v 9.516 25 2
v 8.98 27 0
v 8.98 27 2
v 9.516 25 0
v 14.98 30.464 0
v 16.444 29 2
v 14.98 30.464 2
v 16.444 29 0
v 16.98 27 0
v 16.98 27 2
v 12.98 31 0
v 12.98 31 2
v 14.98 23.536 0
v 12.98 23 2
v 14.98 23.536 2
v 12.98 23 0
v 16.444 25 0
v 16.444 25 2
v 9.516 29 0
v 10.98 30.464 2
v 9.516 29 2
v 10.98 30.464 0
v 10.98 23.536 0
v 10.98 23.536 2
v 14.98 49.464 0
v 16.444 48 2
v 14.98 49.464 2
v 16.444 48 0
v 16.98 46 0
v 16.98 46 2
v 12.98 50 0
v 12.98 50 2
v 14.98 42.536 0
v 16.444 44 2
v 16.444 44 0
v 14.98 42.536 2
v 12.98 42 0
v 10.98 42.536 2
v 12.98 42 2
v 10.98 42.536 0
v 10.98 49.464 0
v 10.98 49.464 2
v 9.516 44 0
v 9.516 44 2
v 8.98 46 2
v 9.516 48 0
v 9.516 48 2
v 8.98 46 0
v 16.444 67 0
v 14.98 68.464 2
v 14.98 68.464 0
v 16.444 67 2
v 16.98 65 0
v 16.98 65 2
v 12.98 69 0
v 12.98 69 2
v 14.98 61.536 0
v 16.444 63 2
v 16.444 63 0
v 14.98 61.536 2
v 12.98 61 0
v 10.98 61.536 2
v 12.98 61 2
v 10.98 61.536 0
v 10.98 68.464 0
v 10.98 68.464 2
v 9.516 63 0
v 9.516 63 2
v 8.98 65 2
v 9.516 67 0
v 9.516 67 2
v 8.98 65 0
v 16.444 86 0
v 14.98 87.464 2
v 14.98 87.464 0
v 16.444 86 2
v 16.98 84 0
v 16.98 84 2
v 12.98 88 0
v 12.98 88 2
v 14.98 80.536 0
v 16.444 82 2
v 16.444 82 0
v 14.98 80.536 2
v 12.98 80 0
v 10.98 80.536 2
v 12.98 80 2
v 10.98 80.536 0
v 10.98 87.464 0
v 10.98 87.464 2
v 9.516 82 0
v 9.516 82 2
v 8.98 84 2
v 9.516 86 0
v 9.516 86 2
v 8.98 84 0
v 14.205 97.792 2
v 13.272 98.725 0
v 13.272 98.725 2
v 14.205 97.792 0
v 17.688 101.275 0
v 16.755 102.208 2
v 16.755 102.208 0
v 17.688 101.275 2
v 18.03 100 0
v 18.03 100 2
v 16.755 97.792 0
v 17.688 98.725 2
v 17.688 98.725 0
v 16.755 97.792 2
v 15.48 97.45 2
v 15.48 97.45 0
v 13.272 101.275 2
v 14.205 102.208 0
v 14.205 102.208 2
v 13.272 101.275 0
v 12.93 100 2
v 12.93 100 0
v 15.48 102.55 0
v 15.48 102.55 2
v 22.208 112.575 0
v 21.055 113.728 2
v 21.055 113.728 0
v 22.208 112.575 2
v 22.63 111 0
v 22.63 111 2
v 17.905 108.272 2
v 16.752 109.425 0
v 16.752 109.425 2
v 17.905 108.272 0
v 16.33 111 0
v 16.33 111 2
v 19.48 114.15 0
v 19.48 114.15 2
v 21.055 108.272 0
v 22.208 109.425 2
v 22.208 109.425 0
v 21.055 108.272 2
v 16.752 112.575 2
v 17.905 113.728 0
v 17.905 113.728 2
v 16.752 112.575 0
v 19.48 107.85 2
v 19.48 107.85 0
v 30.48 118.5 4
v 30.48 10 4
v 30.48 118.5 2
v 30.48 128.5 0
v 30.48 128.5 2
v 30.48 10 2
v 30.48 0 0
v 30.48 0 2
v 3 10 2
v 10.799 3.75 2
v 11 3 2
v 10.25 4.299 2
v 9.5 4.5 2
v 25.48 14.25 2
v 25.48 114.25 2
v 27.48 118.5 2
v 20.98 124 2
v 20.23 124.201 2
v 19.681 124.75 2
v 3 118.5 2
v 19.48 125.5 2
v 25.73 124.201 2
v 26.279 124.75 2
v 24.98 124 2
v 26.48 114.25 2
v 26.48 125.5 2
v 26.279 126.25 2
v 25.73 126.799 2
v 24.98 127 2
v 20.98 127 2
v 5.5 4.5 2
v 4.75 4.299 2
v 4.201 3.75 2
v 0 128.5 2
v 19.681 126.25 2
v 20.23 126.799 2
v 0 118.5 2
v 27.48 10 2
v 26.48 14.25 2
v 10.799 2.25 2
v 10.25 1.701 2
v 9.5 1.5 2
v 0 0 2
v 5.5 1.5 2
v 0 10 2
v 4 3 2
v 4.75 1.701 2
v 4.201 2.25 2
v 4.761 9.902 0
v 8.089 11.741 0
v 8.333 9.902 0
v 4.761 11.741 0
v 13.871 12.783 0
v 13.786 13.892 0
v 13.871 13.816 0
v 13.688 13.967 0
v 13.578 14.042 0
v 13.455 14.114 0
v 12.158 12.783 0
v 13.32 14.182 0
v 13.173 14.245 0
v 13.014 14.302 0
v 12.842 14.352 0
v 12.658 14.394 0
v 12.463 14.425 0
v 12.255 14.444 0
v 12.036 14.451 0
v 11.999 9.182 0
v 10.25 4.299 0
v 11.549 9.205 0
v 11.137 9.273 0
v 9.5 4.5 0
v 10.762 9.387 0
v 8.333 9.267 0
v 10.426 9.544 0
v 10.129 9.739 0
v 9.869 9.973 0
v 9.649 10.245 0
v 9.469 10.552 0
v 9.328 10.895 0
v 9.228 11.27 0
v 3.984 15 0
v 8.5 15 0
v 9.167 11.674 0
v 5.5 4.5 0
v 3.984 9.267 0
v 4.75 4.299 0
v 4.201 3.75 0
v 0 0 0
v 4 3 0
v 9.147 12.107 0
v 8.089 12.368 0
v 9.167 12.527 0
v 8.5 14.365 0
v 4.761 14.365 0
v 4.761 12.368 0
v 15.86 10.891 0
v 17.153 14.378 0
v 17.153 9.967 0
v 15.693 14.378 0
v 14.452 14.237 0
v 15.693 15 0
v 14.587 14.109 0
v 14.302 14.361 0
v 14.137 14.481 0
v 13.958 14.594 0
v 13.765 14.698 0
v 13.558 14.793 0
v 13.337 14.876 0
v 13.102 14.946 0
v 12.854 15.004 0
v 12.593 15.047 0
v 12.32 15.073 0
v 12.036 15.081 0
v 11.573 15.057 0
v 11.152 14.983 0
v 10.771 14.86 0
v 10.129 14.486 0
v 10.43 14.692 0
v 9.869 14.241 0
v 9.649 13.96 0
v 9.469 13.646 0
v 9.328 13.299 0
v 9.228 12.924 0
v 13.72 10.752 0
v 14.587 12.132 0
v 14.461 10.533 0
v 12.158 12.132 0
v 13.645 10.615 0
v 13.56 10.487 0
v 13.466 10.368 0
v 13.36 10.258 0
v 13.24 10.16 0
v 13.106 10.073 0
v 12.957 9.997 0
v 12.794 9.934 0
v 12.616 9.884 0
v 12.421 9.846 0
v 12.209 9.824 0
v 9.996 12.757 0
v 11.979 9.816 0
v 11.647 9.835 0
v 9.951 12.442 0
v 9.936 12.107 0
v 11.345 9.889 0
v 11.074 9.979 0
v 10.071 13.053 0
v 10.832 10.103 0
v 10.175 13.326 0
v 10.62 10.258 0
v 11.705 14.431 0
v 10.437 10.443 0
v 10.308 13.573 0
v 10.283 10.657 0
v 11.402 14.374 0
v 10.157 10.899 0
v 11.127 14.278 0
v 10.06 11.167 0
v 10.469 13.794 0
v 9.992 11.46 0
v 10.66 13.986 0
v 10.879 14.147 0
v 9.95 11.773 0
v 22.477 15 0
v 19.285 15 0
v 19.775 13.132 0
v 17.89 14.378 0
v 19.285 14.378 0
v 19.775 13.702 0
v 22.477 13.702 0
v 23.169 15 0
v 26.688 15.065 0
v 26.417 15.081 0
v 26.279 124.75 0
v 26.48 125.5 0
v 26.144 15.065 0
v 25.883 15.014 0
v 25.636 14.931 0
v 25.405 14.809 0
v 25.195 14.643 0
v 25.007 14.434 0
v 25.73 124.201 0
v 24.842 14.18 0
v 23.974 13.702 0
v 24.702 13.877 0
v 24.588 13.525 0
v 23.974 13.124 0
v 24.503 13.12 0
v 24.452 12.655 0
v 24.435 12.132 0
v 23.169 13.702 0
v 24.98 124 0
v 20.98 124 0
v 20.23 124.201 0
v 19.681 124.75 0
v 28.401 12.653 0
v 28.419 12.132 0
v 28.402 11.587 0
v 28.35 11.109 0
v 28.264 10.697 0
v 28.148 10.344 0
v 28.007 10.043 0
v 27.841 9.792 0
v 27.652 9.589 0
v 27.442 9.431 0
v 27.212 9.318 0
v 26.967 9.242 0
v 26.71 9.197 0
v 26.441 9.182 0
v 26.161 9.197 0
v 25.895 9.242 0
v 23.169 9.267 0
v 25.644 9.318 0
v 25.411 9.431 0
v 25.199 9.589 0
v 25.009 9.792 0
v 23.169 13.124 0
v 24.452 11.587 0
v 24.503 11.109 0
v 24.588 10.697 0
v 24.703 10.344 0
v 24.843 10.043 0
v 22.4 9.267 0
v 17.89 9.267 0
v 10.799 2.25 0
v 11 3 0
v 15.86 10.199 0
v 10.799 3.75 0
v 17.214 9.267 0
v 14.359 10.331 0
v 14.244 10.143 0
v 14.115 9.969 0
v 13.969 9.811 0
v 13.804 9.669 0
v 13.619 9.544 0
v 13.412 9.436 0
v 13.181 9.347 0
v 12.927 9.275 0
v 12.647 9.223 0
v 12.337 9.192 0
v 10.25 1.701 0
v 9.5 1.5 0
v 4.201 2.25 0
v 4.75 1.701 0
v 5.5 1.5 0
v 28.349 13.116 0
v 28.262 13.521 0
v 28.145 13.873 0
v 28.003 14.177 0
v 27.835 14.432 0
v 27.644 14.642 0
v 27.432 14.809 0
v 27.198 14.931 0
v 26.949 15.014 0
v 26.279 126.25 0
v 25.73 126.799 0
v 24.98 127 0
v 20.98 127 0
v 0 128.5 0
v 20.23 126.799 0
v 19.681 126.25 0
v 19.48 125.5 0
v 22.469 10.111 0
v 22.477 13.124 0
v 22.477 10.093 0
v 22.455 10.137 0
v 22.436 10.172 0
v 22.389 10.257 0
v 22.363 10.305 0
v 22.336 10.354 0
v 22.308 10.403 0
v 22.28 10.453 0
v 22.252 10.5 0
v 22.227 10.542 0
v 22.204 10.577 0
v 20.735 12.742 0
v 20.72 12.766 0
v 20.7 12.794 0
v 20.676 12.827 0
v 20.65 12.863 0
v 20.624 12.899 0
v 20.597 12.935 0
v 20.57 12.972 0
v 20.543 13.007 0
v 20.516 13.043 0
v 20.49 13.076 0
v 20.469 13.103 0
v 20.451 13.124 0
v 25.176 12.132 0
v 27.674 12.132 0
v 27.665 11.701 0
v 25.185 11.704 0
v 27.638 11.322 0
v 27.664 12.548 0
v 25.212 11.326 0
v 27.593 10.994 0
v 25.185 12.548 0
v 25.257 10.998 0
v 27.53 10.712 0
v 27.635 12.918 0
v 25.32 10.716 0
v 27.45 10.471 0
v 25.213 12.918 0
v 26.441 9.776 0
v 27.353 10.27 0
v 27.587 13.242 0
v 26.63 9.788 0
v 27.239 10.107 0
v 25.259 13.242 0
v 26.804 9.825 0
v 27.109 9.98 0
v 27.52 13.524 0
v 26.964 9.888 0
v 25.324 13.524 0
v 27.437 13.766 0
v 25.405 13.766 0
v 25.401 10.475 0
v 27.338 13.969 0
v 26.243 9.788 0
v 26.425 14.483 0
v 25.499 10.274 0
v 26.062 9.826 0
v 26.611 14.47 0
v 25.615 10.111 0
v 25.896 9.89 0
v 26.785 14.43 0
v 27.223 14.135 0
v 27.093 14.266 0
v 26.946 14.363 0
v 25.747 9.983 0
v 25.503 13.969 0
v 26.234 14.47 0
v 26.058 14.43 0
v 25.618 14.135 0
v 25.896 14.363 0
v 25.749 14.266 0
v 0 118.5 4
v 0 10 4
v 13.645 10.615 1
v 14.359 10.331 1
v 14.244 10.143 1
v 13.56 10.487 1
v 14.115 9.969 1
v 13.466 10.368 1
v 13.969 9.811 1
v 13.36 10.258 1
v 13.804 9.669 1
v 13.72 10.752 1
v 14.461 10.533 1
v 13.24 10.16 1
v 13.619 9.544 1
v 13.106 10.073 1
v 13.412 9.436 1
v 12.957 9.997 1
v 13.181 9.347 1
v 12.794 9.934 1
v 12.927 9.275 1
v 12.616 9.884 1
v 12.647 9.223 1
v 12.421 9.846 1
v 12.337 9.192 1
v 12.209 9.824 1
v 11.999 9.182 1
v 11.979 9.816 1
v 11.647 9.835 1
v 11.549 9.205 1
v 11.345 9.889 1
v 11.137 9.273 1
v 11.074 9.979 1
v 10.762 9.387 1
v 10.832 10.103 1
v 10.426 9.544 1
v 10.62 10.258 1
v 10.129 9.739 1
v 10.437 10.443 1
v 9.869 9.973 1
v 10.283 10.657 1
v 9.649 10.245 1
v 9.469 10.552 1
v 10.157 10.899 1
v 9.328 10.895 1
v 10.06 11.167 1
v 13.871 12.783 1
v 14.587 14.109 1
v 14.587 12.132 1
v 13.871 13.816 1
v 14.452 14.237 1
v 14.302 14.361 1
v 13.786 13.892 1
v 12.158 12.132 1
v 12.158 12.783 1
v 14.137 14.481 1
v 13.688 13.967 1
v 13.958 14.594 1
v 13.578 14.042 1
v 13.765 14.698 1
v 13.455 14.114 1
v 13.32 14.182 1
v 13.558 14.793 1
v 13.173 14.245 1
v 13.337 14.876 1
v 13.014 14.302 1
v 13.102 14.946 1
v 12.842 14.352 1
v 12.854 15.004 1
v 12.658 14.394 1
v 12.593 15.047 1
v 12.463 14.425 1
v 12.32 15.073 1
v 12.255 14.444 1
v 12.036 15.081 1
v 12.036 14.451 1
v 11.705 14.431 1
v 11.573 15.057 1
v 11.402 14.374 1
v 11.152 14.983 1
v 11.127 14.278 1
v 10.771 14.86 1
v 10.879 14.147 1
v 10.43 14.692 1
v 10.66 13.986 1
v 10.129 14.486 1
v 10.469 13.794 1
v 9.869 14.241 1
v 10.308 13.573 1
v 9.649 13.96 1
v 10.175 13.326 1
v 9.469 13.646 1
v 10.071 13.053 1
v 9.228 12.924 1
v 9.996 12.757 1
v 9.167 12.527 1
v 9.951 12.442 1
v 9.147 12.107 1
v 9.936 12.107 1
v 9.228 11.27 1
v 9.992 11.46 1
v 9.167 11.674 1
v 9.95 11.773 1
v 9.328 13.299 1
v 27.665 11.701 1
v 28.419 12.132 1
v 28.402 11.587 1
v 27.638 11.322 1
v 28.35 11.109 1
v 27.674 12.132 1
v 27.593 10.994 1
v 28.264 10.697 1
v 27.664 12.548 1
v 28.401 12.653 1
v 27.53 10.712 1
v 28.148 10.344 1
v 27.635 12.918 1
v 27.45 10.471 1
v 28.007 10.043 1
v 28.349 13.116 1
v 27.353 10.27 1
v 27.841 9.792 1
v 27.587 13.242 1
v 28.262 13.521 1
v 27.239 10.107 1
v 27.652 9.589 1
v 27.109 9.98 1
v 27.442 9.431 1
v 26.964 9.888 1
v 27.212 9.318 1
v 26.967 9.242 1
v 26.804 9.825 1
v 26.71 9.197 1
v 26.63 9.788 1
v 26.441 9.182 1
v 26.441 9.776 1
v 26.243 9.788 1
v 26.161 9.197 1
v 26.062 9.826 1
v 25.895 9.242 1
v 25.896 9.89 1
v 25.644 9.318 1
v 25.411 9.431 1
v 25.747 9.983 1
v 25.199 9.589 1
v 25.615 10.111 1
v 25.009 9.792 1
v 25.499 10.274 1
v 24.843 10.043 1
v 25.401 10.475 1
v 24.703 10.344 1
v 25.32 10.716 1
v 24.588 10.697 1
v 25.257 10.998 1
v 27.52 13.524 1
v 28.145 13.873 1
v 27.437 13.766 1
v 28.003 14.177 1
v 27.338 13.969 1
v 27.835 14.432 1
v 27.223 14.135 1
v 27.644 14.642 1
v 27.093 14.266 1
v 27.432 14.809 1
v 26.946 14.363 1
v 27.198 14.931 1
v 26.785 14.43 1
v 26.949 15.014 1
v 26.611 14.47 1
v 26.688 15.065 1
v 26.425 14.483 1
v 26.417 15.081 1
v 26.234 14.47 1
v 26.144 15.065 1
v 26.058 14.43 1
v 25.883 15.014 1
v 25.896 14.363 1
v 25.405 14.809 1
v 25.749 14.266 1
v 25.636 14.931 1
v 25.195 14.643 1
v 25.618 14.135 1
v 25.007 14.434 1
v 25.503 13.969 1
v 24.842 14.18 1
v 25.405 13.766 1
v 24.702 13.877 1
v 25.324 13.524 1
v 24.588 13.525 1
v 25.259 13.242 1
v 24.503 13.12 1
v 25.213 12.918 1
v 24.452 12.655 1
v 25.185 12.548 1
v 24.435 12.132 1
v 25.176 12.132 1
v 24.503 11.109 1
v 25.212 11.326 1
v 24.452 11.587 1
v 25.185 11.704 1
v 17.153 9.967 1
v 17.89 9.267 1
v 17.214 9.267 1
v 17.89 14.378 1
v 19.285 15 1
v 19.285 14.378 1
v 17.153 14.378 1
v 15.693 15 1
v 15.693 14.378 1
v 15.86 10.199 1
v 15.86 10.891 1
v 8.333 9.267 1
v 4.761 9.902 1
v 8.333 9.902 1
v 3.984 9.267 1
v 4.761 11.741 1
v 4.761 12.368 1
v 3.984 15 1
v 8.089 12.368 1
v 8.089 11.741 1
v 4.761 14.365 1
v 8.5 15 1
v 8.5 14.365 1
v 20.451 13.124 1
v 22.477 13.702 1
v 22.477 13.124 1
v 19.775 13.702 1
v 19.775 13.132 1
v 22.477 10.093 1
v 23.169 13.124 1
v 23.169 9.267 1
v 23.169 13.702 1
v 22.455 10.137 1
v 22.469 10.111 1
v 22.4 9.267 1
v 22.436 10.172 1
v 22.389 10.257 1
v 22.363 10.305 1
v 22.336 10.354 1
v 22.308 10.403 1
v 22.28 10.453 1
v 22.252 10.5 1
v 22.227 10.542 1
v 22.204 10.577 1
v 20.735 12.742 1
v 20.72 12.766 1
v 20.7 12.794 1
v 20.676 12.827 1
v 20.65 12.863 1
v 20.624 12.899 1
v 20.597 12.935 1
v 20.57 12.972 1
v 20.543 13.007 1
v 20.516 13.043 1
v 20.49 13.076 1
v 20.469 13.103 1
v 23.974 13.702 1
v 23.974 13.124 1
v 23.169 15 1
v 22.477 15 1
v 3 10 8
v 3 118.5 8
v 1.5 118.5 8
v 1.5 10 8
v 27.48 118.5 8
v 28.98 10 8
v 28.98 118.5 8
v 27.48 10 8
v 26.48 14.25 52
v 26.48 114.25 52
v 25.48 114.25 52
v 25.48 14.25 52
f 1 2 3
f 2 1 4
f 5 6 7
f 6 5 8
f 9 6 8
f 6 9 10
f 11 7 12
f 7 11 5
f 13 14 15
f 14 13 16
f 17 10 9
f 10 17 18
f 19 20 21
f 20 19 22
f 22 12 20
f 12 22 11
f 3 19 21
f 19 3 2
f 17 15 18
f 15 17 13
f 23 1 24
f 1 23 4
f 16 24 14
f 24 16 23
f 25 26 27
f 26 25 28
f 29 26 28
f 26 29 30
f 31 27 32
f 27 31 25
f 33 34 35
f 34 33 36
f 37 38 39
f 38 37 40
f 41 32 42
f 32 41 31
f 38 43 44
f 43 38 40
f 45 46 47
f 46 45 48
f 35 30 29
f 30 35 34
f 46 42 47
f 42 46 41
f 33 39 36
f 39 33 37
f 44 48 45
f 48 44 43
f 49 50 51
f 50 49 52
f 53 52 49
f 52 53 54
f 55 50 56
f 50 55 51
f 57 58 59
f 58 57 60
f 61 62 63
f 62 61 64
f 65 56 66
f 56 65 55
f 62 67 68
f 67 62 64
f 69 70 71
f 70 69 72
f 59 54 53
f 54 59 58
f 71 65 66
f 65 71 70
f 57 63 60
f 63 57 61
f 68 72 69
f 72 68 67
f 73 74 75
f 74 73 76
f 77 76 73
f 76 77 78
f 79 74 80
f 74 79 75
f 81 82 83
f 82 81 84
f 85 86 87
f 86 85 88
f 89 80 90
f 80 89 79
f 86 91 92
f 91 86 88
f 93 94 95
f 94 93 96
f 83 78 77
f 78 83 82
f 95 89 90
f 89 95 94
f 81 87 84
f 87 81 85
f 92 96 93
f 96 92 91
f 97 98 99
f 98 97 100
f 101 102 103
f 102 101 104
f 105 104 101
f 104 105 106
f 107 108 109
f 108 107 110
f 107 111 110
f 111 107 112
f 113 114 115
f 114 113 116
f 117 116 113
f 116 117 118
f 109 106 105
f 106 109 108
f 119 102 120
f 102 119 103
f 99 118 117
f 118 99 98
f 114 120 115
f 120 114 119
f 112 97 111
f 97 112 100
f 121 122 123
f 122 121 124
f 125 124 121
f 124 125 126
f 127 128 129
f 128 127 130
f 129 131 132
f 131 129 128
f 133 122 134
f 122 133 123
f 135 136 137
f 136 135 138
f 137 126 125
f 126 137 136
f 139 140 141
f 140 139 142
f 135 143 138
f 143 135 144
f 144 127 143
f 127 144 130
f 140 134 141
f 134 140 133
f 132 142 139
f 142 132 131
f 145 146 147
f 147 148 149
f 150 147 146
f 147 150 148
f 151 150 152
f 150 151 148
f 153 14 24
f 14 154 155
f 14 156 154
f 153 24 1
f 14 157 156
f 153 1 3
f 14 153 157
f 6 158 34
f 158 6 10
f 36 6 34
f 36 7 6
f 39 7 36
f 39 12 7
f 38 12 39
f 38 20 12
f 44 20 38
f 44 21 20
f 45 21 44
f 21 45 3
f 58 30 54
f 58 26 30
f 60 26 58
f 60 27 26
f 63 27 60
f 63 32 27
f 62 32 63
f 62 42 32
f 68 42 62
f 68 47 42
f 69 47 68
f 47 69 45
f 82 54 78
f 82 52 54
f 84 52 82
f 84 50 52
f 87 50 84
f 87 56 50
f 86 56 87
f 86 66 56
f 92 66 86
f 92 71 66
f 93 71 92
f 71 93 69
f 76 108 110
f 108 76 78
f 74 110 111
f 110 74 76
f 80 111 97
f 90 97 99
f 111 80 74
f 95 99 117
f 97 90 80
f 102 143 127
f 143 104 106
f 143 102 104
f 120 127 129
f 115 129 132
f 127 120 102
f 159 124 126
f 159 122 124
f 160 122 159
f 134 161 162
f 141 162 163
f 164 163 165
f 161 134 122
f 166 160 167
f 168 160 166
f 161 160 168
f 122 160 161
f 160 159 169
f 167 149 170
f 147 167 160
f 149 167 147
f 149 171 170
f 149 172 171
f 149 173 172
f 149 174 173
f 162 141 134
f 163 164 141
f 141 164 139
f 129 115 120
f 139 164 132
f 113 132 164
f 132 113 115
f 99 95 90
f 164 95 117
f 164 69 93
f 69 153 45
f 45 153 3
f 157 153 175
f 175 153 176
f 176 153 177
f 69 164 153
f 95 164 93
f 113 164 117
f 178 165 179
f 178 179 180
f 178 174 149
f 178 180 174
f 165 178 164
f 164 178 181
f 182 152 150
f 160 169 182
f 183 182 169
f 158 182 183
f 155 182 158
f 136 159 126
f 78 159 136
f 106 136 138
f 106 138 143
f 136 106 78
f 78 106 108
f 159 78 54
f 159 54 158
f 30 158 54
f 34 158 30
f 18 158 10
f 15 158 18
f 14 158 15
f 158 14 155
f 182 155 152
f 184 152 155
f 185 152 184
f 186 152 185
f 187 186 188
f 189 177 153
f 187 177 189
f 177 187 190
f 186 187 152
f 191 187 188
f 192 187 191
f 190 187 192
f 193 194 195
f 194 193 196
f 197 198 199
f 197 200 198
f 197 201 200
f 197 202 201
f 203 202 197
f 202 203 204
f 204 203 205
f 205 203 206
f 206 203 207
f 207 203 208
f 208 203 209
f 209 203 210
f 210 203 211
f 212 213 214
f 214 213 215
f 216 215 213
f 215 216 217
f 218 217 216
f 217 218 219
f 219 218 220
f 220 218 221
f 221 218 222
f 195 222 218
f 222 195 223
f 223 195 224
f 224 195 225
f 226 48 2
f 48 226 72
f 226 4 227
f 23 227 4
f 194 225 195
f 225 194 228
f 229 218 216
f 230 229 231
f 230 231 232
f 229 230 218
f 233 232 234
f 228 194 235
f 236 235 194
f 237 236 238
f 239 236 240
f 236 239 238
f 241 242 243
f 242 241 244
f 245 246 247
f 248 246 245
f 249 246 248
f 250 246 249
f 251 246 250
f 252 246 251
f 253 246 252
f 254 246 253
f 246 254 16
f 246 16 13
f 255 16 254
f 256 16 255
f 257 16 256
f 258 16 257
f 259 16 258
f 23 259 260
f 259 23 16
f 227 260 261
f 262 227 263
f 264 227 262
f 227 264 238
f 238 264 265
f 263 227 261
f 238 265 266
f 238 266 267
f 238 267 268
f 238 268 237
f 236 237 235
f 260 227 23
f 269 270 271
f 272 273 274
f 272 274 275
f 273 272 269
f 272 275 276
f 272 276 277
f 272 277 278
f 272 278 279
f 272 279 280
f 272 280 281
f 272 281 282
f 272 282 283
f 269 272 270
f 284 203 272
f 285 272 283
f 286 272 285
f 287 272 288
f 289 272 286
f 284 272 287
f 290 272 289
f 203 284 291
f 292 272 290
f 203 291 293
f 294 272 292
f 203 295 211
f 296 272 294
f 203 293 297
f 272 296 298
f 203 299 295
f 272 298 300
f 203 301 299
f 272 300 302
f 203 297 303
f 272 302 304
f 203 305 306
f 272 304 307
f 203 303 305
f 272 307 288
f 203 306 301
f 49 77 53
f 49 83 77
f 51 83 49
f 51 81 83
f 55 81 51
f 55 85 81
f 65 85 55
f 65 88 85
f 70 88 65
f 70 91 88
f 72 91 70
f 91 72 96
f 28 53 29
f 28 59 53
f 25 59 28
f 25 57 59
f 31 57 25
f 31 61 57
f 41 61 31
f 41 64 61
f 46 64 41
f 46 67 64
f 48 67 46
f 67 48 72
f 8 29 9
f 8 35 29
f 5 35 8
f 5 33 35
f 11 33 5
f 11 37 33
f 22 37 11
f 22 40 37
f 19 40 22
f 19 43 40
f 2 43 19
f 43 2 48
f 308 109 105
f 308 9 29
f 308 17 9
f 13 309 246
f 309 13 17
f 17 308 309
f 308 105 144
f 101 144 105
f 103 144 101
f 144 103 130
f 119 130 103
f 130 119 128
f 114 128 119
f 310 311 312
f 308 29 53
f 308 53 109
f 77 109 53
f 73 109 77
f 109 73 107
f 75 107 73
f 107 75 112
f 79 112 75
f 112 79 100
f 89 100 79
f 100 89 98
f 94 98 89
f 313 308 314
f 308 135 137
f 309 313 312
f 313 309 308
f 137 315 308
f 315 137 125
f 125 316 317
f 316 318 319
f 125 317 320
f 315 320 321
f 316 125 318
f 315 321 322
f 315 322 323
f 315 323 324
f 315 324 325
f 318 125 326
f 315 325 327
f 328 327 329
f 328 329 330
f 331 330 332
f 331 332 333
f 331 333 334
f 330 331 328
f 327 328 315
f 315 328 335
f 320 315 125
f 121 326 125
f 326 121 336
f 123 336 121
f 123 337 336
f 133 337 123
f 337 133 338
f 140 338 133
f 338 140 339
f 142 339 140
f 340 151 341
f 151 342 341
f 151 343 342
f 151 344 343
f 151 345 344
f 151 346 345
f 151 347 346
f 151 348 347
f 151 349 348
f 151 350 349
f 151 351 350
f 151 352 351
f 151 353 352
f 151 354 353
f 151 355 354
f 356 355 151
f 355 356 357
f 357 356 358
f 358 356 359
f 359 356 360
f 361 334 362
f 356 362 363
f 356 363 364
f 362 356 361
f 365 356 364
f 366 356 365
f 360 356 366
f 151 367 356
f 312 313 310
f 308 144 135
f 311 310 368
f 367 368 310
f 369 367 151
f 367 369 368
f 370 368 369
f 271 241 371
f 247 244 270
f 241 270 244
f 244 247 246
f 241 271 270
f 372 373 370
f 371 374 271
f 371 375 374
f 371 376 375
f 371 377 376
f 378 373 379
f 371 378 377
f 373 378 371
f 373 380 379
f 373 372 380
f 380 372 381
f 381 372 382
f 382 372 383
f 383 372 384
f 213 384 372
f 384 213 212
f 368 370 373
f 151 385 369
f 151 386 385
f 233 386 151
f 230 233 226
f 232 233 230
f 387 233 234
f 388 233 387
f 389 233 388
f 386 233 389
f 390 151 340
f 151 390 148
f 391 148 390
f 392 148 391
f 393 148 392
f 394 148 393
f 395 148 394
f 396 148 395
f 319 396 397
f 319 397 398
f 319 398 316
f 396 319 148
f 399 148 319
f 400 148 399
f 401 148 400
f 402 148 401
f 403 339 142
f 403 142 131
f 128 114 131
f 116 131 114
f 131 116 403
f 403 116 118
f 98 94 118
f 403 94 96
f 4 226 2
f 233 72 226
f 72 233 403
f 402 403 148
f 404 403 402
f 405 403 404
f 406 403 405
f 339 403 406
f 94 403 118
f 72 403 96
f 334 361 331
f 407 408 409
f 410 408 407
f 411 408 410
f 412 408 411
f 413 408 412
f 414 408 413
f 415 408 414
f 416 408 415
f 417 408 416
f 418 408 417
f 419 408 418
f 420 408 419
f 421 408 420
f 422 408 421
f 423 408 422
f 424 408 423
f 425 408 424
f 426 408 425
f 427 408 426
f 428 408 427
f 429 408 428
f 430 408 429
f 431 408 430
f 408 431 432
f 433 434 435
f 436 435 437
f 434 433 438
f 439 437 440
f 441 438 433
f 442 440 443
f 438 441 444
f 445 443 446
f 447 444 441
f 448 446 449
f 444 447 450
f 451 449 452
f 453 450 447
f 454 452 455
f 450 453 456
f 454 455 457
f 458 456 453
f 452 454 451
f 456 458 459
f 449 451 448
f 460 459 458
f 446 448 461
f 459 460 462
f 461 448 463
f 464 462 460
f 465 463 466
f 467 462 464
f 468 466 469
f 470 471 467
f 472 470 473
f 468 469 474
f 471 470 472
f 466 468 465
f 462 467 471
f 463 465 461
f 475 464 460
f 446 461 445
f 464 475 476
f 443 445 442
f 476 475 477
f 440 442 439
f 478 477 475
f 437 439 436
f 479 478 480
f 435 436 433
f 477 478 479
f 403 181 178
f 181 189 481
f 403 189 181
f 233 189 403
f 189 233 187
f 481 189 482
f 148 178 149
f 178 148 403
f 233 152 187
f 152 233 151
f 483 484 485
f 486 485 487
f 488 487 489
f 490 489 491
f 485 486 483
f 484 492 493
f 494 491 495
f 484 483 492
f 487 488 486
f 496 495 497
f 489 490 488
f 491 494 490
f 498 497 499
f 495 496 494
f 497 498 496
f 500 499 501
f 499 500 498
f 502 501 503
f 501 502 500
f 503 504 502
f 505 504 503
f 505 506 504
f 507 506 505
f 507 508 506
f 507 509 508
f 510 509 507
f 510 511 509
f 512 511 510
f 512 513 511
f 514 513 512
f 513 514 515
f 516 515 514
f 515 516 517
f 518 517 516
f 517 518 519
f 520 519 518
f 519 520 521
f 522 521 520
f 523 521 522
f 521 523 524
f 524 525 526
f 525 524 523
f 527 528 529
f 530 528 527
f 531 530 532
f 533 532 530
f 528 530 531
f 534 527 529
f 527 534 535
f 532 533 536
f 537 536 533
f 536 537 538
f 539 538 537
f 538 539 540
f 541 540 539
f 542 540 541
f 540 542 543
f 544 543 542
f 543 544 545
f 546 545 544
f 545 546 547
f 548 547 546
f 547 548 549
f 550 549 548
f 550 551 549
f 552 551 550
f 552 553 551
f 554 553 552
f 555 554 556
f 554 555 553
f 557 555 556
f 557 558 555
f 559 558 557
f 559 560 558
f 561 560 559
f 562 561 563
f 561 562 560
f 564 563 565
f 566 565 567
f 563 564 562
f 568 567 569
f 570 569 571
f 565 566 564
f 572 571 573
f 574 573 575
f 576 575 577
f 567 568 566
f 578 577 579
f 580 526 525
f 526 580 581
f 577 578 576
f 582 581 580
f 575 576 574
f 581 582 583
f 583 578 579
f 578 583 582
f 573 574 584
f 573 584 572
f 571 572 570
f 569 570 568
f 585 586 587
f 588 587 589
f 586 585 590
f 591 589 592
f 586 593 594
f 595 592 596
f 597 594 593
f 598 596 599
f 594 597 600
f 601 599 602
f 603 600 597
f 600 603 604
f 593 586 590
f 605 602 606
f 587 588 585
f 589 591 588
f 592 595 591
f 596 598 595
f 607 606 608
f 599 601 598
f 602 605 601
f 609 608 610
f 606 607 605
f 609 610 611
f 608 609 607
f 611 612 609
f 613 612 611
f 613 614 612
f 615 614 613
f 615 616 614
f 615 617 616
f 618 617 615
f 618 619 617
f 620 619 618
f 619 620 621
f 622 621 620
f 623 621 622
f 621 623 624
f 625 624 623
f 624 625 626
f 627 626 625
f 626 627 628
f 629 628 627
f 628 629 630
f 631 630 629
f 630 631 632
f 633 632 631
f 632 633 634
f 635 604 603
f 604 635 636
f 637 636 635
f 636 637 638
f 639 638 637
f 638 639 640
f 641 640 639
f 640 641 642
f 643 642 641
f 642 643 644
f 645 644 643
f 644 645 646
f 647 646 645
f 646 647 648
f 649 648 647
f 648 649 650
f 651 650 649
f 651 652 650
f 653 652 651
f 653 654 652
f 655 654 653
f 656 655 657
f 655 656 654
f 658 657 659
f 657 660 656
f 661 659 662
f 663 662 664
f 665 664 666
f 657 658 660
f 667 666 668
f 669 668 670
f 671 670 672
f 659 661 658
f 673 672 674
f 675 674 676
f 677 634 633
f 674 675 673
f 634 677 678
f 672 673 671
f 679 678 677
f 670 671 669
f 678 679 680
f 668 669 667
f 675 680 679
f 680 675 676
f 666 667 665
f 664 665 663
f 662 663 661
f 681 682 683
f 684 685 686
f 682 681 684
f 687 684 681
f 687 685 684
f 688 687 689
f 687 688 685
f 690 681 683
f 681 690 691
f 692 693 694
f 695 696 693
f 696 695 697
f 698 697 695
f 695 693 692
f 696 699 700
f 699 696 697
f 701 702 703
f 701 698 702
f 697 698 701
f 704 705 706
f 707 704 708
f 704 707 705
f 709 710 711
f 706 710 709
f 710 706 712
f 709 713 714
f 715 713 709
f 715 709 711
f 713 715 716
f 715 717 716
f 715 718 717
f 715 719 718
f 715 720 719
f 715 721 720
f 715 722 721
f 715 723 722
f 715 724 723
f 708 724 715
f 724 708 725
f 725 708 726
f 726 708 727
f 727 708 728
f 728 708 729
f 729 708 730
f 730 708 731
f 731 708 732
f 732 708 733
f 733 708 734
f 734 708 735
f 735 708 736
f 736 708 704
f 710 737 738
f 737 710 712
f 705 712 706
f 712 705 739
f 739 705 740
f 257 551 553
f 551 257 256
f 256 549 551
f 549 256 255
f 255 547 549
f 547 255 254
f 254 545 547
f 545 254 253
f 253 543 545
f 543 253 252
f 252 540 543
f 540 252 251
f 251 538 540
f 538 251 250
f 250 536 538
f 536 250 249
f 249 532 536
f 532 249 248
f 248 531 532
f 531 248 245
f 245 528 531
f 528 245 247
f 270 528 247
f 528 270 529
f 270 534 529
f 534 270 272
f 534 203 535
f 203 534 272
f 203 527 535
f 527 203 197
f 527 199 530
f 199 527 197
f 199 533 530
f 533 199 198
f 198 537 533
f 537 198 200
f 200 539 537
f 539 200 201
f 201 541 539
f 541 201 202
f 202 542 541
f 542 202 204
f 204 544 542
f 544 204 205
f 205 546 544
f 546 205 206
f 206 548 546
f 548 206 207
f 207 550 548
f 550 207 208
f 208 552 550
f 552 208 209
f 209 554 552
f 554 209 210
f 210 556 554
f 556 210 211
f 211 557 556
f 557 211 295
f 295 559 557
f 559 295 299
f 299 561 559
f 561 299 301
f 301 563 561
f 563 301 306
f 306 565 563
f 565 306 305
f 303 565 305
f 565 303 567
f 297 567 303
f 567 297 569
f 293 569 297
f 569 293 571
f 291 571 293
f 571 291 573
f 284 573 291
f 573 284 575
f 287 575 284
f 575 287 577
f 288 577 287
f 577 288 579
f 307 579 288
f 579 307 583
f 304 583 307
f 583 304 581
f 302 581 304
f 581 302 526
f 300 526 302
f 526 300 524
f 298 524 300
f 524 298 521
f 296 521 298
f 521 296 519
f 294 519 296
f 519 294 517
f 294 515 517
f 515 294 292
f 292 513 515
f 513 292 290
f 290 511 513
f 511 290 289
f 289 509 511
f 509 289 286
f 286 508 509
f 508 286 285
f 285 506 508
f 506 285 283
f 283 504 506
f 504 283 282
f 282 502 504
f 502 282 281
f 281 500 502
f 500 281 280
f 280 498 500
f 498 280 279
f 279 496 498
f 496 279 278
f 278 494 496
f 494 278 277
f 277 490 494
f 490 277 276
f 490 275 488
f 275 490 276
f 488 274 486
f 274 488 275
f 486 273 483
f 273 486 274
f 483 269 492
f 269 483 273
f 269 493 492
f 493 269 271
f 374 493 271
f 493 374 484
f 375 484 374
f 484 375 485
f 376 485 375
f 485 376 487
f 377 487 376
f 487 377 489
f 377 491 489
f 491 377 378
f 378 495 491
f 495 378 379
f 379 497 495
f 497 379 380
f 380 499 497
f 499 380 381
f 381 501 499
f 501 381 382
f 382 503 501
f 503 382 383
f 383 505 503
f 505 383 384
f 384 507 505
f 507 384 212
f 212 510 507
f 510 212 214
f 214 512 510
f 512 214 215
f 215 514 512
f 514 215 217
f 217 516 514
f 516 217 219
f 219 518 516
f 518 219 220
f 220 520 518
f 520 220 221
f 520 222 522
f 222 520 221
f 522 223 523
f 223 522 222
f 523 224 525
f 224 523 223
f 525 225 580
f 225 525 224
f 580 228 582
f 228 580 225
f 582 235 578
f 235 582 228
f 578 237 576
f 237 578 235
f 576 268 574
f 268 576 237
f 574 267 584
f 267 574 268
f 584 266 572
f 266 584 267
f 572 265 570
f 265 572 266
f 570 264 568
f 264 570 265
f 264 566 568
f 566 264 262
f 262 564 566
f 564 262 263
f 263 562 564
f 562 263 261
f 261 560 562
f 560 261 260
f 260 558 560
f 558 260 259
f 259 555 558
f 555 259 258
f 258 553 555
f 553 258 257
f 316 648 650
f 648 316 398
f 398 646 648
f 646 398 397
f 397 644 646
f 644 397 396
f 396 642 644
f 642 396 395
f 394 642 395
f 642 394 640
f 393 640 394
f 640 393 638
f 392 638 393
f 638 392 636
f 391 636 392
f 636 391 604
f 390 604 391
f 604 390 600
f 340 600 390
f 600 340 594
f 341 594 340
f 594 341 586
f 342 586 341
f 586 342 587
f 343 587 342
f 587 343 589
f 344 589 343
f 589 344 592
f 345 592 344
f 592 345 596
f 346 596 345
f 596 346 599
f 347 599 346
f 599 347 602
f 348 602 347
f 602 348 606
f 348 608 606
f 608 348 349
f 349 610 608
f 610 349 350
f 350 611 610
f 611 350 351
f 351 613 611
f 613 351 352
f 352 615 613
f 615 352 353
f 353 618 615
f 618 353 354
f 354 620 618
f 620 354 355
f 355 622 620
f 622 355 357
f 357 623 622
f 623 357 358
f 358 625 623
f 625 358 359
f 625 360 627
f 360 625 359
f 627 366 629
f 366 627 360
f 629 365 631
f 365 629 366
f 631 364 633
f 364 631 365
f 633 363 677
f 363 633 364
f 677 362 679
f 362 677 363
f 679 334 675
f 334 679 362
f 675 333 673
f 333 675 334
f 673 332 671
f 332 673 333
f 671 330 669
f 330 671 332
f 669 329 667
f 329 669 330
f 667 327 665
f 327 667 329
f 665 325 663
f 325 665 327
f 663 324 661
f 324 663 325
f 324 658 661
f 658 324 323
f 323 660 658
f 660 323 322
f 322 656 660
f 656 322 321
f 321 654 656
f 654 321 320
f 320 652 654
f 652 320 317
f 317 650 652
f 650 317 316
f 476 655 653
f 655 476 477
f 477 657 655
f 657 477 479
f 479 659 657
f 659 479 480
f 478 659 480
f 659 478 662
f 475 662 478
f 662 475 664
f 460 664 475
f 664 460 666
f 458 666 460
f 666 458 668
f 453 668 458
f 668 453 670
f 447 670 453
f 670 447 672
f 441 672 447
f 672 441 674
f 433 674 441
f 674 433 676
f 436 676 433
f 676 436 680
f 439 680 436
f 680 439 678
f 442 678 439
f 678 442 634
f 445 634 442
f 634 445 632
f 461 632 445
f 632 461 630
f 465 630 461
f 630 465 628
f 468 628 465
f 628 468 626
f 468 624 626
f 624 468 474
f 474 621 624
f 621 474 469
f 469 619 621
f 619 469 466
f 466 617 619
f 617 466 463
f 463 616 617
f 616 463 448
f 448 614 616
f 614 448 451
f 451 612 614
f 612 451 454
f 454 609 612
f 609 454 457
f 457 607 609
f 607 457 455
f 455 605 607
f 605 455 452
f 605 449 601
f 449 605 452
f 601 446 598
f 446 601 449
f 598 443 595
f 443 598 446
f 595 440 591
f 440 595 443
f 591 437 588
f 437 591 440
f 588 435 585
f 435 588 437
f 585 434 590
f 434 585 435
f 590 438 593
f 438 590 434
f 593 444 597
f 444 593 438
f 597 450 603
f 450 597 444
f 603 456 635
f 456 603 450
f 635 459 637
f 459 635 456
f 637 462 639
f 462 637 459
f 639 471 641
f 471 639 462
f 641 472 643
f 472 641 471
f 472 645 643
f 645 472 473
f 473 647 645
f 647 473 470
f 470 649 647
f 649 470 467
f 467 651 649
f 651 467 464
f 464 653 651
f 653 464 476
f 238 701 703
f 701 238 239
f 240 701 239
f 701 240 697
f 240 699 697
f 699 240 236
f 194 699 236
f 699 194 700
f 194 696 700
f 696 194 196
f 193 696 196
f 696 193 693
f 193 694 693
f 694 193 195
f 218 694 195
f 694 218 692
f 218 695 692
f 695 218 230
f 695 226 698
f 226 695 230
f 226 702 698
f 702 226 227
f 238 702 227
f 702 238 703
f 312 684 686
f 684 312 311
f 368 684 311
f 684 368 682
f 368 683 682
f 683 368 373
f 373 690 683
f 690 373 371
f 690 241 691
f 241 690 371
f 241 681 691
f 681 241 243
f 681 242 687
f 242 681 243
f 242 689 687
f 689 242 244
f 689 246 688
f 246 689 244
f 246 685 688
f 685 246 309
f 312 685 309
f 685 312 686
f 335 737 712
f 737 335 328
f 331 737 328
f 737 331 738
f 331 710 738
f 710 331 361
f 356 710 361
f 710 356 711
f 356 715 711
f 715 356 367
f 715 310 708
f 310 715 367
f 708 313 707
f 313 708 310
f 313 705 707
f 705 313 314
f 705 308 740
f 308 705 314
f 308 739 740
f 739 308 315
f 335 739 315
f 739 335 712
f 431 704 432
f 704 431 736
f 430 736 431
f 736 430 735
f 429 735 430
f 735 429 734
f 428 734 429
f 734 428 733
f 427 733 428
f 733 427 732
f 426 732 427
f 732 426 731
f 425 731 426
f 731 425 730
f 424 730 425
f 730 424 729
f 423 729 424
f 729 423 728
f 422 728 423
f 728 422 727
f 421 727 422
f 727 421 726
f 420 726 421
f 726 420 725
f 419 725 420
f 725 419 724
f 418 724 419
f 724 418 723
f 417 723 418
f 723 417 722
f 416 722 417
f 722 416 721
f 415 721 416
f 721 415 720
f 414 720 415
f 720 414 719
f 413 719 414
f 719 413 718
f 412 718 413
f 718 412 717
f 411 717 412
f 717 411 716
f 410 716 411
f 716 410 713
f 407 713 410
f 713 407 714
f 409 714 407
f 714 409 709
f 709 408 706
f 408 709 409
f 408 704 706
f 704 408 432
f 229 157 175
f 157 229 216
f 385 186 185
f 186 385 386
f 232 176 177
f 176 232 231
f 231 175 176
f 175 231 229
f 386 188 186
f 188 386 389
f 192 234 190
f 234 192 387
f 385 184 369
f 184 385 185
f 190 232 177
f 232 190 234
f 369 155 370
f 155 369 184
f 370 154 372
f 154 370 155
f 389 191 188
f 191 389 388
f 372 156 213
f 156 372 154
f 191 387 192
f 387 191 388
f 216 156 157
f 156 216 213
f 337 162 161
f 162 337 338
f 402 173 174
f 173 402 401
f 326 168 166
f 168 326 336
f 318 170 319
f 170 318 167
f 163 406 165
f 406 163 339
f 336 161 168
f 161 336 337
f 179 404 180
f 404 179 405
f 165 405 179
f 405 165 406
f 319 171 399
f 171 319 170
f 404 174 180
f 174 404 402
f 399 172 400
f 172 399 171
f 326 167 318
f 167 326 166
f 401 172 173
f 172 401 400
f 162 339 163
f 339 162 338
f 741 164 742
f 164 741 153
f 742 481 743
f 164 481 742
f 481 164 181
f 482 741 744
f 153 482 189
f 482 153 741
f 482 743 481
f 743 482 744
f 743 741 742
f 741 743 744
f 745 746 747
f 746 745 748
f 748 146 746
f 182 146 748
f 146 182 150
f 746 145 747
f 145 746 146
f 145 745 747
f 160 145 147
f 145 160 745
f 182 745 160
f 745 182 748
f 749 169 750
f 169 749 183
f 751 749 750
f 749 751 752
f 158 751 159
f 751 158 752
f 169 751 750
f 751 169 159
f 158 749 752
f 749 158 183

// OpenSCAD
EuroPanel("EG140", 6);

module EuroPanel(label, hp=8) {
    
    sideOffset = 5;
    panelWidth = hp*5.08;

    translate([0,118.5,2]) scale([.75,1,1]) rotate([90,0,0]) Support();
    translate([panelWidth,118.5,2]) scale([-.75,1,1]) rotate([90,0,0]) Support();
    

    difference() {
        cube([hp*5.08, 128.5, 2]);

        translate([3.3,15,1]) rotate([180,0,0])  {
            linear_extrude(height=2)
                text(label, size=6);
        }    

        translate([7.5,3]) MountingHole();
        translate([panelWidth - 7.5, 128.5 - 3]) MountingHole();

        translate ([panelWidth - sideOffset, 27, 0]) union() {
            KnobHole();
            translate([0,19,0]) KnobHole();
            translate([0,38,0]) KnobHole();
            translate([0,57,0]) KnobHole();
            translate([0,73,0]) LEDHole();
            translate([0,84,0]) JackHole();
        }

    }
        
    color("green", .3) translate([panelWidth - sideOffset, 14.25,2]) cube([1,100,50]);
    
}

module KnobHole() {
    translate([-12.5,0,-.5])
        cylinder(h=3, d=8, $fn=12);
}

module JackHole() {
    translate([-6,0,-.5])
        cylinder(h=3, d=6.3, $fn=12);
}

module LEDHole() {
    translate([-10,0,-.5])
        cylinder(h=3, d=5.1, $fn=12);
}

module Support() {
    linear_extrude(108.5)
    polygon([[0,0], [0,2], [2,6], [4,6], [4,0]]);
}


module MountingHole() {
    hull() {
        translate([-2,0,-.5])
        cylinder(h=3, r=1.5, $fn=12);
        translate([2,0,-.5])
        cylinder(h=3, r=1.5, $fn=12);
    }
}

echo(version=version());
